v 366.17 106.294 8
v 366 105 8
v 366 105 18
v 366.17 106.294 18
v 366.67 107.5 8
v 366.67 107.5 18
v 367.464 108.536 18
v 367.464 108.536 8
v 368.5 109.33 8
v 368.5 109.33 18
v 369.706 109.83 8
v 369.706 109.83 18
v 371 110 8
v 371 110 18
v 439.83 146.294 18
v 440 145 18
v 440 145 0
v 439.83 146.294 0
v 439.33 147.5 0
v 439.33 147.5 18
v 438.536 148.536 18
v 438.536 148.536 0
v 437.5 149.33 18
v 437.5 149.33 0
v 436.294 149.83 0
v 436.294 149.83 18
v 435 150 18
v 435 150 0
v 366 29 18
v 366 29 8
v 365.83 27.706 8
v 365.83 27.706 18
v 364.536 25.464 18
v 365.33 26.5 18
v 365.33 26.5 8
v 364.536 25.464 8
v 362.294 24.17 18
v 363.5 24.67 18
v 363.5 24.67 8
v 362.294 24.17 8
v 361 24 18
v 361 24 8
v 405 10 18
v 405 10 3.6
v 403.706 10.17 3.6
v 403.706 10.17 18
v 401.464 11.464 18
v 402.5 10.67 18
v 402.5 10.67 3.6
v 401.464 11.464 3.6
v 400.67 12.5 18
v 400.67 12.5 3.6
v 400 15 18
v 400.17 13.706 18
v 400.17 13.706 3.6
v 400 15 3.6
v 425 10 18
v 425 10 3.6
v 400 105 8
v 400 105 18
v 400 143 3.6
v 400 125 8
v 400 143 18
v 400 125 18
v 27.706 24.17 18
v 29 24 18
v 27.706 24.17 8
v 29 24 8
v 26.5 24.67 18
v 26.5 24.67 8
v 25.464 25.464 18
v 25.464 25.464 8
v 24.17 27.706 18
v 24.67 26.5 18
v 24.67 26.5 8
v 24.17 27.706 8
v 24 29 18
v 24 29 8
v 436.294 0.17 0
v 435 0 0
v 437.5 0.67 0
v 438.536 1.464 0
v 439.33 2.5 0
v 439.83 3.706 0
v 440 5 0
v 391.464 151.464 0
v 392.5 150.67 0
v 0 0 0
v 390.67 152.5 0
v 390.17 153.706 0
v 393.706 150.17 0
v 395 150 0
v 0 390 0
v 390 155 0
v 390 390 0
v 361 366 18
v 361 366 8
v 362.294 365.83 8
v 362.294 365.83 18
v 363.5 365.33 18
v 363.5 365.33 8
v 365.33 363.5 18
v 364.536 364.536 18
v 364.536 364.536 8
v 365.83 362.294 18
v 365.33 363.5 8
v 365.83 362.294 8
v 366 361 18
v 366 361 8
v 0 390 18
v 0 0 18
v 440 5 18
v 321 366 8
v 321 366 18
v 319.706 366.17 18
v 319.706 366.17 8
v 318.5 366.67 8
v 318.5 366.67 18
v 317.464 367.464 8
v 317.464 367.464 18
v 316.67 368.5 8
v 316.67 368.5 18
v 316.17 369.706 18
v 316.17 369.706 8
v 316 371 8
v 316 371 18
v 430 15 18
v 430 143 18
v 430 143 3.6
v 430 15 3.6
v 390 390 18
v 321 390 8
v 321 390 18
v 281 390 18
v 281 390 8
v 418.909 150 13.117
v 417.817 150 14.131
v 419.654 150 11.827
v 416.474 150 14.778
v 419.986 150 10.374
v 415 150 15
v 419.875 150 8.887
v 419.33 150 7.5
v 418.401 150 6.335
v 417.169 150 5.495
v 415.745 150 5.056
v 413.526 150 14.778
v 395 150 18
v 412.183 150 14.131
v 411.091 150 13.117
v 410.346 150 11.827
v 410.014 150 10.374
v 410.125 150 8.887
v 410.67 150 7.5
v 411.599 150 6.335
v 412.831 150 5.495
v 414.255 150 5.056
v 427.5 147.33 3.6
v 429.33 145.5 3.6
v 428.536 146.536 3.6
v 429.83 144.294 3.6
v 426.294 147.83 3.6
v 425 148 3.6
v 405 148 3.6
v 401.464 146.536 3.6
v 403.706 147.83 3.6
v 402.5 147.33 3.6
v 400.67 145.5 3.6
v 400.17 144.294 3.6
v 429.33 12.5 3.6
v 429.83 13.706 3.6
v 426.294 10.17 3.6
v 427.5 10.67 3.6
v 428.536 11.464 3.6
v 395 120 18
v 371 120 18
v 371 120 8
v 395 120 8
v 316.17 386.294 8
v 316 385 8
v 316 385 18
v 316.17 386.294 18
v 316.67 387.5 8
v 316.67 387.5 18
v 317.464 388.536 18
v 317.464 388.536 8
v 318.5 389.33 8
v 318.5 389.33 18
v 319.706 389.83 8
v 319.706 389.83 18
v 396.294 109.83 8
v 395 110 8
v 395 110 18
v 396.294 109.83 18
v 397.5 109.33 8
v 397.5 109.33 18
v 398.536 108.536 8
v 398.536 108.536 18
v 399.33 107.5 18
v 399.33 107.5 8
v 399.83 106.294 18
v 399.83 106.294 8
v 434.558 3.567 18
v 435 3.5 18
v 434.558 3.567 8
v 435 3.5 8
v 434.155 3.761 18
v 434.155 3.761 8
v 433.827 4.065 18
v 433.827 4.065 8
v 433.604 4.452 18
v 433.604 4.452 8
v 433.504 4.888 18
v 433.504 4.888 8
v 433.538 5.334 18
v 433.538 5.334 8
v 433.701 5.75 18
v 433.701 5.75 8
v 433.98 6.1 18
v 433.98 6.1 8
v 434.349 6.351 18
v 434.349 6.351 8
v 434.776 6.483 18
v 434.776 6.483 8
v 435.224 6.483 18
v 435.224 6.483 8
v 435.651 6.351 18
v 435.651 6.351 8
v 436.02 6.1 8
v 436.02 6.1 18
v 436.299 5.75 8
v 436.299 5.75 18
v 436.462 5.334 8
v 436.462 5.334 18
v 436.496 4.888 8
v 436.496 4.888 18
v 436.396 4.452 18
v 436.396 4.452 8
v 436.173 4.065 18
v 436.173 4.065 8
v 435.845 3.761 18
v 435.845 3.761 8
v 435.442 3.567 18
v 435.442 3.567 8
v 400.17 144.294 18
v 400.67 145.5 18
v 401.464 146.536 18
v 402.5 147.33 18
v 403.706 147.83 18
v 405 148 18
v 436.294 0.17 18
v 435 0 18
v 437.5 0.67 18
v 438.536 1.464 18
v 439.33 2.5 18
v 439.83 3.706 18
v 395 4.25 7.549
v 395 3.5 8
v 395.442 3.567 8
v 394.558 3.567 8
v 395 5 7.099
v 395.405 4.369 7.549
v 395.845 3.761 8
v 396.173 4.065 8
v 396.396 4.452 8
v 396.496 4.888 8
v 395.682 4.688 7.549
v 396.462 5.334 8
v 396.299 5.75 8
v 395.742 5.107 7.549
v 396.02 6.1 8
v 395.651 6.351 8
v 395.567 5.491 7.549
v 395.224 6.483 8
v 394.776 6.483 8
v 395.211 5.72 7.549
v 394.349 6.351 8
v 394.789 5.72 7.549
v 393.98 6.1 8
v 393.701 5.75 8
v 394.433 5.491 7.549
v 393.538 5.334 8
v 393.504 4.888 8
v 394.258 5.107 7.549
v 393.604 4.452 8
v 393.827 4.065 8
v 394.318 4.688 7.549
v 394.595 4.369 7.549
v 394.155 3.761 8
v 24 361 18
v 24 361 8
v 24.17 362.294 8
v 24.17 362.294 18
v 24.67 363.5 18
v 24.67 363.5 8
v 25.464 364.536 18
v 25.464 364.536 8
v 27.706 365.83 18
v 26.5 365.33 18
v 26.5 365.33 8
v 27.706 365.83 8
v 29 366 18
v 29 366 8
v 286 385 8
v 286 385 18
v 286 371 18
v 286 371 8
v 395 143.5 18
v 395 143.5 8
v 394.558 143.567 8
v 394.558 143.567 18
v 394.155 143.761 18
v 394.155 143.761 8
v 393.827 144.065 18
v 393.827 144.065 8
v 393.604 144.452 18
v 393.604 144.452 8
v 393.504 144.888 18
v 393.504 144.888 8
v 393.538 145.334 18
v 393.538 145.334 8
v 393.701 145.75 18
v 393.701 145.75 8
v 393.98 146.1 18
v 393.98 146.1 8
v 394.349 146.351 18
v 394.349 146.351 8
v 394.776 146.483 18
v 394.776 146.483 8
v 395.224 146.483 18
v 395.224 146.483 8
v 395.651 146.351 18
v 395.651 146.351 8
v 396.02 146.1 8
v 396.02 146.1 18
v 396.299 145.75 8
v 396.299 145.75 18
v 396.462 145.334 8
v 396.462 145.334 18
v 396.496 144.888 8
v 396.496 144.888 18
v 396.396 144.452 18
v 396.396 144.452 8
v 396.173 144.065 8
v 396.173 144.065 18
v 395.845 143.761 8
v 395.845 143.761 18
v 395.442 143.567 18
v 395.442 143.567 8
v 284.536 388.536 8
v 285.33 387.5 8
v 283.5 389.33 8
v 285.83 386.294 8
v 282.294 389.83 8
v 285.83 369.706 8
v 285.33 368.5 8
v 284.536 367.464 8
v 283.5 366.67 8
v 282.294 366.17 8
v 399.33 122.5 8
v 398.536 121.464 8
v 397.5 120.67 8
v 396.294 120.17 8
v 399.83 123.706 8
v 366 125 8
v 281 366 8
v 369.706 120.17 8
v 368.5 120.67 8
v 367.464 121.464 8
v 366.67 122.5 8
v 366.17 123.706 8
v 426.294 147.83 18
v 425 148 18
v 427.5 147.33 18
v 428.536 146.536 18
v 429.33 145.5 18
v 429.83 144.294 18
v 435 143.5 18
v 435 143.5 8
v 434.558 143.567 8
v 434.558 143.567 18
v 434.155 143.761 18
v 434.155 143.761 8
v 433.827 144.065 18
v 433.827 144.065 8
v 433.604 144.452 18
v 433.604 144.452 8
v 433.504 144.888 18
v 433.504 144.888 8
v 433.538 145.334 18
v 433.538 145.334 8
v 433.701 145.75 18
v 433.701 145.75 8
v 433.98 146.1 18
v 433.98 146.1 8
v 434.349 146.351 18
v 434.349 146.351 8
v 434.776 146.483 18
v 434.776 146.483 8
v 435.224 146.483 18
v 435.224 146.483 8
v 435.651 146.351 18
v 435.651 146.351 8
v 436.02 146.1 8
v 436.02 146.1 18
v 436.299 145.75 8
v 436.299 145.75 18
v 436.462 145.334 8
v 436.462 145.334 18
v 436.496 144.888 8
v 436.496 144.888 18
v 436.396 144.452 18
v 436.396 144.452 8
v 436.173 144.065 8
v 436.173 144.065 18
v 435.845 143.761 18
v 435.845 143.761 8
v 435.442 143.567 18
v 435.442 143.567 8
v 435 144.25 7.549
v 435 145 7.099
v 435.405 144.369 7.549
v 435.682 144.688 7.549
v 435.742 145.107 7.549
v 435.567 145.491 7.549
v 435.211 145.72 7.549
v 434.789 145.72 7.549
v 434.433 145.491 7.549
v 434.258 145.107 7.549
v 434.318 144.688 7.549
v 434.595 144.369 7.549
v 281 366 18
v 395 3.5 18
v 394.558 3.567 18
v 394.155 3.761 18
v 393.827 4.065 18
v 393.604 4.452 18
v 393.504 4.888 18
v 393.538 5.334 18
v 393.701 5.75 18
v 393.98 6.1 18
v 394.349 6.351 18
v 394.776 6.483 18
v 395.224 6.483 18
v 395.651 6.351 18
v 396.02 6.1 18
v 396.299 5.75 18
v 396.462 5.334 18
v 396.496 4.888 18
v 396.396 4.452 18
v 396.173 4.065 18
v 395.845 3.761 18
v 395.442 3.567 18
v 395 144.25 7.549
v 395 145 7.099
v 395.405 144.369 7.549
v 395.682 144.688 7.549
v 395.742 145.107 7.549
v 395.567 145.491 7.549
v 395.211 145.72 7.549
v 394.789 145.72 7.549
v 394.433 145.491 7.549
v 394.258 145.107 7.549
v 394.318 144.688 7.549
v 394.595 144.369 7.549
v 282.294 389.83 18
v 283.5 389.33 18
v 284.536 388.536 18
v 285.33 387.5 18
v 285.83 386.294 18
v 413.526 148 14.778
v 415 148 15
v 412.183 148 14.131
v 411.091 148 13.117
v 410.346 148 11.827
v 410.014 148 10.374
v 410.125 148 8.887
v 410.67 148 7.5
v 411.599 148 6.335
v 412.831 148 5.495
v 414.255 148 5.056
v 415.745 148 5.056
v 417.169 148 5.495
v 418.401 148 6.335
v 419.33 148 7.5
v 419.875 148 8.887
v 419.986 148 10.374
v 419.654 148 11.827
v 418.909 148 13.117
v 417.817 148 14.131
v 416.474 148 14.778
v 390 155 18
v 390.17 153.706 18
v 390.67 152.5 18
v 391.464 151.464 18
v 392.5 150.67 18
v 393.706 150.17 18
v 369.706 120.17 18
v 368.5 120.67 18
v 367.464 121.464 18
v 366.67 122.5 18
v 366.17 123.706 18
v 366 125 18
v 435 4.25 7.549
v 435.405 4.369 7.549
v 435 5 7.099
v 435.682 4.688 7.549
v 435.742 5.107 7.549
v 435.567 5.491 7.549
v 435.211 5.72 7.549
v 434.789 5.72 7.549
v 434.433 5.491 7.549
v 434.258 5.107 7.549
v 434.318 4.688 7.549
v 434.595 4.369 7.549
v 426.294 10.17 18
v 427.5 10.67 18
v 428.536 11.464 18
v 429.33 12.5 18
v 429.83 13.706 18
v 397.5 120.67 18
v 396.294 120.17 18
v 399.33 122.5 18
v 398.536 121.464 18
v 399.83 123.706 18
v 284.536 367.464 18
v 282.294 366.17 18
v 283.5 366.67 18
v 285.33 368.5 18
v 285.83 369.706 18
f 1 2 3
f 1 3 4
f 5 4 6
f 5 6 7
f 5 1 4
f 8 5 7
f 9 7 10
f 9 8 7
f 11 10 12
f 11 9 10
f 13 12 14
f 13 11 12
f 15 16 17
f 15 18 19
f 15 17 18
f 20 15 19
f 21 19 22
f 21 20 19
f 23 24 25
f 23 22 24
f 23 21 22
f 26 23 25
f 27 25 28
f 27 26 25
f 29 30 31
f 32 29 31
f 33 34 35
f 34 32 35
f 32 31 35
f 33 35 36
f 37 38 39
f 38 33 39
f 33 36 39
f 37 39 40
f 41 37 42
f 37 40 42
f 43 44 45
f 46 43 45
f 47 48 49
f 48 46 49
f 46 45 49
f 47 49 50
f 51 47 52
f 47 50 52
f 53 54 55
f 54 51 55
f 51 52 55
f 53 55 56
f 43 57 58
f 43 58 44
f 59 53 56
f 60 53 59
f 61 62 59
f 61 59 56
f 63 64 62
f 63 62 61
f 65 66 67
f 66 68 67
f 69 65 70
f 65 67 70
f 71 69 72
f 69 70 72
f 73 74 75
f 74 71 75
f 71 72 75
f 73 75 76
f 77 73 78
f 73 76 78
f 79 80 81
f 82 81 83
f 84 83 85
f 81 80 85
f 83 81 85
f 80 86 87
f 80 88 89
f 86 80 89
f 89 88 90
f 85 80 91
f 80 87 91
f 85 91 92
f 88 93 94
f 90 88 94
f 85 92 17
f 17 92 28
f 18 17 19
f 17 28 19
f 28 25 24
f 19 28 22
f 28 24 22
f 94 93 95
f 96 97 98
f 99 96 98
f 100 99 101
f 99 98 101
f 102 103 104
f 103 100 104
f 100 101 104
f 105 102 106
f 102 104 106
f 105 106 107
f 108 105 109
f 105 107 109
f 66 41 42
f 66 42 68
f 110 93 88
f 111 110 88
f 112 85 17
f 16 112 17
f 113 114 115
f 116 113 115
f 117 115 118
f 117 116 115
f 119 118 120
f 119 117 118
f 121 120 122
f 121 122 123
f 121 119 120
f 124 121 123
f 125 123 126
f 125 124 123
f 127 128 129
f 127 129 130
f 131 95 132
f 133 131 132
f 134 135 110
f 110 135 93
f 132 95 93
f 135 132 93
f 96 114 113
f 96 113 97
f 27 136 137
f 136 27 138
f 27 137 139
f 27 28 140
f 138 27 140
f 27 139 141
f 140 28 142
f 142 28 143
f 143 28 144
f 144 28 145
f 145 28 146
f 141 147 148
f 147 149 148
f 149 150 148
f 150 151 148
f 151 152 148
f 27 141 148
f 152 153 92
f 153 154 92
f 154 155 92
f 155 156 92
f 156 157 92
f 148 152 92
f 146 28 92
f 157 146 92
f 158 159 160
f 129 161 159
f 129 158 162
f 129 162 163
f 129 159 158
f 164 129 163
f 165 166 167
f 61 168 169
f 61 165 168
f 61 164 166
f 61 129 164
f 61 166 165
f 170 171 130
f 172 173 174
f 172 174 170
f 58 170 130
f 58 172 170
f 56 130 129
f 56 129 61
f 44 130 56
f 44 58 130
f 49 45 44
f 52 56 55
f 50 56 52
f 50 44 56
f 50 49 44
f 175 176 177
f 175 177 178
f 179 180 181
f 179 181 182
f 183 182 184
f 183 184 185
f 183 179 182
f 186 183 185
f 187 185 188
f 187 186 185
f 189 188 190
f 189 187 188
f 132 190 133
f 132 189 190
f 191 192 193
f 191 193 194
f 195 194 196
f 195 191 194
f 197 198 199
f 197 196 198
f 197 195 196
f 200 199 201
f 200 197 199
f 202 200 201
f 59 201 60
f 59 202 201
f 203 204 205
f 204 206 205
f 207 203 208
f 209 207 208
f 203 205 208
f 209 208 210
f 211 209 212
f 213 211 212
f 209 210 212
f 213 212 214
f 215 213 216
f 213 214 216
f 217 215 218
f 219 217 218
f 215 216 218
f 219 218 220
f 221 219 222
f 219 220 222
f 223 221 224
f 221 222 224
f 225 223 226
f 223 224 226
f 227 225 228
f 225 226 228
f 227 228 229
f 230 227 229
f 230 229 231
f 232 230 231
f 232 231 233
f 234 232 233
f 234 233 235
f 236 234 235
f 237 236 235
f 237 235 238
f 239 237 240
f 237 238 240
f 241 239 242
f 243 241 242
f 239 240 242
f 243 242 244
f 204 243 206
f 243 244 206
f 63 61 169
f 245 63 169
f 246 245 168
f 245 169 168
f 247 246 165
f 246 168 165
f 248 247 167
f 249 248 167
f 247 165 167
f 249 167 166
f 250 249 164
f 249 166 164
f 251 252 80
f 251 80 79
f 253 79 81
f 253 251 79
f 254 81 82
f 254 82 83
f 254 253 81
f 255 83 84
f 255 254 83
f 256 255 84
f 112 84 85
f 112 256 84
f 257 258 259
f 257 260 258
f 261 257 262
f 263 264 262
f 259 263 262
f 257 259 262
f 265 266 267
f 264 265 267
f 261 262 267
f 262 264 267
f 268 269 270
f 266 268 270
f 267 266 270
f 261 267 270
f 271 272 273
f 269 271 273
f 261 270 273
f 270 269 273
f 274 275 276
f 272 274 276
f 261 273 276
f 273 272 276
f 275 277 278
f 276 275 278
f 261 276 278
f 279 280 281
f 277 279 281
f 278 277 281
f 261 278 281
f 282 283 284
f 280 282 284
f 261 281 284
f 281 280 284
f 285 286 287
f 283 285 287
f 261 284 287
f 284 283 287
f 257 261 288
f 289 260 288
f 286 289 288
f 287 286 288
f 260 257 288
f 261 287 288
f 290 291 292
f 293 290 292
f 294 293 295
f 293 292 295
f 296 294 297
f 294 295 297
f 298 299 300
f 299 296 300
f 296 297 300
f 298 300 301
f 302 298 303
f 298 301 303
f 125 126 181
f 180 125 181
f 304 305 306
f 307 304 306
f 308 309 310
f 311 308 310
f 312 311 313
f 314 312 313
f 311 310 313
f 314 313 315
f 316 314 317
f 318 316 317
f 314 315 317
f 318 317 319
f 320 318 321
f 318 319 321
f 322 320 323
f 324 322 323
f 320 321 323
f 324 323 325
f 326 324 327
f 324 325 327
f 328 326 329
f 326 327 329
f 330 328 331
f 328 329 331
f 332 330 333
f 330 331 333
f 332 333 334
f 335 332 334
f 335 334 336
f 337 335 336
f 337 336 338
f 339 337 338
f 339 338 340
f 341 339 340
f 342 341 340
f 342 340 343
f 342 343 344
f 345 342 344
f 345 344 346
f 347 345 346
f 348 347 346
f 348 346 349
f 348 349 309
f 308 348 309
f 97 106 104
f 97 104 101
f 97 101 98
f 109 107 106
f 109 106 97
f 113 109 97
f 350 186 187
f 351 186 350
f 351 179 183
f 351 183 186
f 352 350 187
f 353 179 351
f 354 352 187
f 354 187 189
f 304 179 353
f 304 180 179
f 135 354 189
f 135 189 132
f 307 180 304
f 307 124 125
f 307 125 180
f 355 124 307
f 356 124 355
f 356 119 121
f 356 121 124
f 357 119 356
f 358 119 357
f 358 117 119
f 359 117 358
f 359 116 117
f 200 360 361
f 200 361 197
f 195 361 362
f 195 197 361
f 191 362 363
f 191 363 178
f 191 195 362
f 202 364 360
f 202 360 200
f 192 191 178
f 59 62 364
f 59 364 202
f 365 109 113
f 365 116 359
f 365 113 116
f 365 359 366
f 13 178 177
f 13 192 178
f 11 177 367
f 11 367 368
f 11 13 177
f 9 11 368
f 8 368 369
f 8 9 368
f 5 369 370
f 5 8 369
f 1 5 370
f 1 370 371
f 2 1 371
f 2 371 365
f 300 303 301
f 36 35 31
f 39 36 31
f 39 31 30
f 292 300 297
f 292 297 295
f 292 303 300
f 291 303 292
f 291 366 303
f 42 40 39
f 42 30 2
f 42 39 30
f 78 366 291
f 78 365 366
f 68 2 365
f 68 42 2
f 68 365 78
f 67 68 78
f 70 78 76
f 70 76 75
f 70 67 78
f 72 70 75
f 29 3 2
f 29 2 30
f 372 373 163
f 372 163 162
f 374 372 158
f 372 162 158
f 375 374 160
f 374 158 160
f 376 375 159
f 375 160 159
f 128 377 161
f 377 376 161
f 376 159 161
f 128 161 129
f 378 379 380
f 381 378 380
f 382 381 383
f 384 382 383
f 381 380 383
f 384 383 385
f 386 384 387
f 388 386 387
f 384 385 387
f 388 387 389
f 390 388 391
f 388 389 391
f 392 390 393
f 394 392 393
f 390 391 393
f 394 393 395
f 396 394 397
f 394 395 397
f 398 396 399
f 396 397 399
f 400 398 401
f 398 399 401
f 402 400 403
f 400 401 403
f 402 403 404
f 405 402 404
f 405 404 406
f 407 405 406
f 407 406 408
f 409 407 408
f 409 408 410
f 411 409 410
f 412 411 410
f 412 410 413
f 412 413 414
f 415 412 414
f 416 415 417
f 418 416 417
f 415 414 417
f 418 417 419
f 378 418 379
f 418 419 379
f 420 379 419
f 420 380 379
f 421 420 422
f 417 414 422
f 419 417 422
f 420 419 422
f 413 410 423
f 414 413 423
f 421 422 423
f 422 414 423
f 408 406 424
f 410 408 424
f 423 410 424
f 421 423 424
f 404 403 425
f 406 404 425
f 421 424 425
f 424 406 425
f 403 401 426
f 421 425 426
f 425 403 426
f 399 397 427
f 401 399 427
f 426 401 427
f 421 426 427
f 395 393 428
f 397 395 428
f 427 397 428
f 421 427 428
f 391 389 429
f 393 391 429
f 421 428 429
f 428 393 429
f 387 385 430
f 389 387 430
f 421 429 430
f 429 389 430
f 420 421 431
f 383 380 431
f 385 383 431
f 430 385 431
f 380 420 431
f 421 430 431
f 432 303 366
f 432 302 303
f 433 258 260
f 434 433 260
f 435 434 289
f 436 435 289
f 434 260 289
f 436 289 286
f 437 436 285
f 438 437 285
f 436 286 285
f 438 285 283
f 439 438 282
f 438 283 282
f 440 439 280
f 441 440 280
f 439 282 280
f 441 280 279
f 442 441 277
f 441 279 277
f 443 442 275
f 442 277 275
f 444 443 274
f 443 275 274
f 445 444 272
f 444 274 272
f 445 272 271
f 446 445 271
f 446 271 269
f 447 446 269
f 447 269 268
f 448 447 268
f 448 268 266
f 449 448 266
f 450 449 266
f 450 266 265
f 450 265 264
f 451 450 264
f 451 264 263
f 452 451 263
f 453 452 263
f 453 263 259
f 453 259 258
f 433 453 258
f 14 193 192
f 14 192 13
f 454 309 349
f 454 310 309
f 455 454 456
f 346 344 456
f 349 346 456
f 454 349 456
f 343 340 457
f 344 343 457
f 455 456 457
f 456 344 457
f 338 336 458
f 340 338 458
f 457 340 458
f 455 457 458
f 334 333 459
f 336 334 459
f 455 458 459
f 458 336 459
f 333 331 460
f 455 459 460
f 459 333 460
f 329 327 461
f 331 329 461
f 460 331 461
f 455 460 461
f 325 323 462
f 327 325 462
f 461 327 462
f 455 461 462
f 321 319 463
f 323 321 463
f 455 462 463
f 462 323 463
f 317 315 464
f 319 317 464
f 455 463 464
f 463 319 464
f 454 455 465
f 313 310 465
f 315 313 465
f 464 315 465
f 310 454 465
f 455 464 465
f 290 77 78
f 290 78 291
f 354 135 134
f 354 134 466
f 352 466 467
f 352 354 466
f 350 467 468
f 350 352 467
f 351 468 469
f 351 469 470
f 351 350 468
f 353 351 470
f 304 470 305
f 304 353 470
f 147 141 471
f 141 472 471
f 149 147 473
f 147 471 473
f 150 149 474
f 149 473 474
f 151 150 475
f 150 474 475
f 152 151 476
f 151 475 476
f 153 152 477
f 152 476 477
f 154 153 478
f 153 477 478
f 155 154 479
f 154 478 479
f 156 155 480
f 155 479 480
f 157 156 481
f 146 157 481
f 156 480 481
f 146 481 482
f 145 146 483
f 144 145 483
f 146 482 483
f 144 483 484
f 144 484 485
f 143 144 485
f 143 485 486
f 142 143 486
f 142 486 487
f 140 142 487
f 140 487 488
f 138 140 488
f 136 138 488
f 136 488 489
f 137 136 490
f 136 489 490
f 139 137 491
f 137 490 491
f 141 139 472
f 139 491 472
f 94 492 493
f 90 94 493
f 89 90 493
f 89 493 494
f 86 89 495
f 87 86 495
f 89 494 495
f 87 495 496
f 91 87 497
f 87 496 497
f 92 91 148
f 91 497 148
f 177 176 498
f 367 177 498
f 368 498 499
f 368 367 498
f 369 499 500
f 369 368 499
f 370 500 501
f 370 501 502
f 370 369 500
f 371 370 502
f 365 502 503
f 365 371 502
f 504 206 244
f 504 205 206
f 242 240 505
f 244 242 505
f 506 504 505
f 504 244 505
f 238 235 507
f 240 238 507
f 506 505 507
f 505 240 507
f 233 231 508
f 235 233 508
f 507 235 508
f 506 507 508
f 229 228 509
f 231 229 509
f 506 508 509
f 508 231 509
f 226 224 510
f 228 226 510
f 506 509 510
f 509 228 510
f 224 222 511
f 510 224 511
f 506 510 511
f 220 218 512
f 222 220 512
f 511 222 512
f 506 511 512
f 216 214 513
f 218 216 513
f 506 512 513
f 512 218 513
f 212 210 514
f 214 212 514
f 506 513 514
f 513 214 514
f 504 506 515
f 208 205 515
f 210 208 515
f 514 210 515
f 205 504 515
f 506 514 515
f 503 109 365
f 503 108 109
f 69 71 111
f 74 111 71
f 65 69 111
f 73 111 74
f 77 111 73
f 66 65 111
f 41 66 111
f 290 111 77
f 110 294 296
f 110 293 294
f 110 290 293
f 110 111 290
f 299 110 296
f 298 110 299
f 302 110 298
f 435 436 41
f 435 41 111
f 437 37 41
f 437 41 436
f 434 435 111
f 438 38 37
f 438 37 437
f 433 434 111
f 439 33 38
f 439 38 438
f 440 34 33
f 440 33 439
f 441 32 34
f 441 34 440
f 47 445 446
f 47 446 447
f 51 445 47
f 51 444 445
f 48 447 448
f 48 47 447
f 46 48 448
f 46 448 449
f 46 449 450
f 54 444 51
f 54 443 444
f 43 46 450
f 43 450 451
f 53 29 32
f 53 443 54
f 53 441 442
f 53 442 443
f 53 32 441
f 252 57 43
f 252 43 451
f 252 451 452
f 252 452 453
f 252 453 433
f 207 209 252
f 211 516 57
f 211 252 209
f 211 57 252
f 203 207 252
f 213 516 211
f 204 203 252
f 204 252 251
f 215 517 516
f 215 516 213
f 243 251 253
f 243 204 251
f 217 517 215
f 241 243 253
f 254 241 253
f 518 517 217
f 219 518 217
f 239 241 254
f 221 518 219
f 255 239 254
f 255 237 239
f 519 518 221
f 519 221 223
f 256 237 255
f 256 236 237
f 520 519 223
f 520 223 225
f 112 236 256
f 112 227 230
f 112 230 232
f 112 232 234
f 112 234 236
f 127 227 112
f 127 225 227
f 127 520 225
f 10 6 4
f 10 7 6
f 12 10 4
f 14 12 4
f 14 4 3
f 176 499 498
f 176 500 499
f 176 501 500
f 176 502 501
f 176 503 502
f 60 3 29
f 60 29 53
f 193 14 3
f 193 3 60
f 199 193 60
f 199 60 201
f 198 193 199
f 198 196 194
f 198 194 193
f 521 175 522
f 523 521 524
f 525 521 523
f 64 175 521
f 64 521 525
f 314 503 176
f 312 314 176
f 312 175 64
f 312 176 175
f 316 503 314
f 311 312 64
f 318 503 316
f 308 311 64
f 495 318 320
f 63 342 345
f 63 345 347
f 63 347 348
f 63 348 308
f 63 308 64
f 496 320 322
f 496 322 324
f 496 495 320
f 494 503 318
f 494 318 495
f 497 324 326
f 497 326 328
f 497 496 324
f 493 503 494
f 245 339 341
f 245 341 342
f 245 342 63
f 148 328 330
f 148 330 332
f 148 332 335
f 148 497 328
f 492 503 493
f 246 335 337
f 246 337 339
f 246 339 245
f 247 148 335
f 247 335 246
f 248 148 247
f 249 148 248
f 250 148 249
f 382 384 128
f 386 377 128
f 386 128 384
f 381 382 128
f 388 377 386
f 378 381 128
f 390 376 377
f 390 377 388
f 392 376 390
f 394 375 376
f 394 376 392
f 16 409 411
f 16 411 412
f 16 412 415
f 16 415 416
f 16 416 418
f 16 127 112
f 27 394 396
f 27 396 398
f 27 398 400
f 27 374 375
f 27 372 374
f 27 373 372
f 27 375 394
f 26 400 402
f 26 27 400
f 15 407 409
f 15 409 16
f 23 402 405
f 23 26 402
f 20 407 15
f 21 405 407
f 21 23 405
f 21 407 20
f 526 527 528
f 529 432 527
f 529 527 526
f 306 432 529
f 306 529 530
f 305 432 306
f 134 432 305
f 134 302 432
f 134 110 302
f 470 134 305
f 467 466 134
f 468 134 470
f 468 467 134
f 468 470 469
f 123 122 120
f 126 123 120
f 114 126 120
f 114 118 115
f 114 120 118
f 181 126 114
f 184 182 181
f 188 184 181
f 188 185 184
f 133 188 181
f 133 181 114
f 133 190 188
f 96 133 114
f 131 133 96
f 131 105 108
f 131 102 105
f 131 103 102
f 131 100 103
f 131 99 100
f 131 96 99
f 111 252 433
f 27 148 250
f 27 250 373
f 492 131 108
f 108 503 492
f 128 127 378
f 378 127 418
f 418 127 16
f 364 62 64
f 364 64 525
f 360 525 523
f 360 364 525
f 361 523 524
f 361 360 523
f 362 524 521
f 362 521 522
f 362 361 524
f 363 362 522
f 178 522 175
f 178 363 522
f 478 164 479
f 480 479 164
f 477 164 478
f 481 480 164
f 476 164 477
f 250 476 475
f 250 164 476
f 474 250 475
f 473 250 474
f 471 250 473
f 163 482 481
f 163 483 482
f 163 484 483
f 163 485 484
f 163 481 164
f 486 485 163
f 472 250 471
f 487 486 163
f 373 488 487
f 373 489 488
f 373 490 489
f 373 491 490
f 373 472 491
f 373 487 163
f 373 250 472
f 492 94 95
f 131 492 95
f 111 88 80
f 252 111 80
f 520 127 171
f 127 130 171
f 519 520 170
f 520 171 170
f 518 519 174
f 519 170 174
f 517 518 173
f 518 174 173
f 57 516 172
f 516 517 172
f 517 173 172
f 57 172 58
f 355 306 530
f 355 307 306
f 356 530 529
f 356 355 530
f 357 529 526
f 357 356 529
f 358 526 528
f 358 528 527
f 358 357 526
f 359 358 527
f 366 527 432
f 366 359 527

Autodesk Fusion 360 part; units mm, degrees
sketch "Sketch1" plane through (0, 0, 0) normal (0, 0, 1) x (1, 0, 0)
  line L0 (0, 0) -> (390, 0)
  line L1 (390, 0) -> (390, 390)
  line L2 (390, 390) -> (0, 390)
  line L3 (0, 390) -> (0, 0)
  line L4 (390, 0) -> (440, 0)
  line L5 (440, 0) -> (440, 150)
  line L6 (440, 150) -> (390, 150)
  line L7 (390, 150) -> (390, 0)
  dimension "d5" = 390
  dimension "d6" = 390
  dimension "d23" = 150
  dimension "d26" = 50
extrude "Extrude1" add sketch "Sketch1" along normal blind 18
fillet "Fillet2" radius 5 3 edges at (440, 0, 9) (440, 150, 9) (390, 150, 9)
sketch "Sketch4" plane through (0, 0, 18) normal (0, 0, 1) x (-1, 0, 0)
  arc A0 (-440, -145) -> (-435, -150) centre (-435, -145) ccw
  line L0 (-435, -150) -> (-395, -150)
  arc A1 (-390, -155) -> (-395, -150) centre (-395, -155) ccw
  line L1 (-390, -155) -> (-390, -390)
  line L2 (-390, -390) -> (0, -390)
  line L3 (0, -390) -> (0, 0)
  line L4 (0, 0) -> (-435, 0)
  arc A2 (-435, 0) -> (-440, -5) centre (-435, -5) ccw
  line L5 (-440, -5) -> (-440, -145)
  line L6 (-400, -148) -> (-430, -148)
  line L7 (-430, -148) -> (-430, -10)
  line L8 (-430, -10) -> (-400, -10)
  line L9 (-400, -10) -> (-400, -148)
  point P0 (-395, -145)
  point P1 (-435, -145)
  point P2 (-435, -5)
  point P3 (-395, -5)
  dimension "d28" = 10
  dimension "d29" = 10
  dimension "d30" = 10
  dimension "d38" = 2
  dimension "d50" = 5
  dimension "d51" = 5
  dimension "d52" = 5
  dimension "d53" = 5
  dimension "d54" = 5
  dimension "d55" = 45
  dimension "d59" = 45
extrude "Extrude4" cut sketch "Sketch4" against normal blind 14.4 contours L6 L7 L8 L9
fillet "Fillet3" radius 5 4 edges at (400, 10, 10.8) (430, 10, 10.8) (400, 148, 10.8) (430, 148, 10.8)
sketch "Sketch5" plane through (0, 0, 18) normal (0, 0, 1) x (-1, 0, 0)
  line L0 (-400, -15) -> (-400, -143)
  arc A0 (-390, -155) -> (-395, -150) centre (-395, -155) ccw
  line L1 (-390, -155) -> (-390, -390)
  line L2 (-390, -390) -> (0, -390)
  line L3 (0, -390) -> (0, 0)
  line L4 (0, 0) -> (-435, 0)
  arc A1 (-435, 0) -> (-440, -5) centre (-435, -5) ccw
  line L5 (-440, -5) -> (-440, -145)
  arc A2 (-440, -145) -> (-435, -150) centre (-435, -145) ccw
  line L6 (-435, -150) -> (-395, -150)
  line L7 (-430, -143) -> (-430, -15)
  arc A3 (-425, -10) -> (-430, -15) centre (-425, -15) ccw
  line L8 (-425, -10) -> (-405, -10)
  arc A4 (-400, -15) -> (-405, -10) centre (-405, -15) ccw
  line L9 (-24, -366) -> (-366, -366)
  line L10 (-366, -366) -> (-366, -24)
  line L11 (-366, -24) -> (-24, -24)
  line L12 (-24, -24) -> (-24, -366)
  line L13 (-405, -148) -> (-425, -148)
  arc A5 (-405, -148) -> (-400, -143) centre (-405, -143) ccw
  arc A6 (-430, -143) -> (-425, -148) centre (-425, -143) ccw
  line L14 (-316, -366) -> (-316, -390)
  line L15 (-316, -390) -> (-286, -390)
  line L16 (-286, -390) -> (-286, -366)
  line L17 (-366, -120) -> (-400, -120)
  line L18 (-400, -120) -> (-400, -110)
  line L19 (-400, -110) -> (-366, -110)
  line L20 (-366, -110) -> (-366, -120)
  dimension "d34" = 342
  dimension "d35" = 342
  dimension "d36" = 24
  dimension "d37" = 24
  dimension "d41" = 50
  dimension "d42" = 30
  dimension "d60" = 30
  dimension "d61" = 10
extrude "Extrude5" cut sketch "Sketch5" against normal blind 10 contours L0 L10 L17 L18 L19 L20 | L9 L10 L11 L12 L20 | L2 L9 L14 L15 L16
fillet "Fillet4" radius 5 8 edges at (24, 366, 13) (286, 366, 13) (24, 24, 13) (366, 24, 13) (366, 366, 13) (316, 366, 13) (316, 390, 13) (286, 390, 13)
fillet "Fillet4" radius 5 4 edges at (366, 120, 13) (400, 120, 13) (366, 110, 13) (400, 110, 13)
sketch "Sketch6" plane through (0, 150, 0) normal (0, 1, 0) x (-1, 0, 0)
  line L0 (-395, 0) -> (-395, 18)
  line L1 (-435, 18) -> (-435, 0)
  line L2 (-435, 0) -> (-395, 0)
  line L3 (-440, 18) -> (-440, 0)
  line L4 (-395, 18) -> (-435, 18)
  point P0 (-415, 10)
  dimension "d45" = 25
  dimension "d46" = 10
hole "Hole1" at (415, 150, 10) direction (0, -1, 0) diameter 10 depth 2 tip angle 118
hole "Hole2" at (395, 5, 18) at (435, 5, 18) at (435, 145, 18) at (395, 145, 18) direction (0, 0, -1) diameter 3 depth 10 tip angle 118
equation "b = 350 mm"
equation "d = 350 mm"
equation "t_base = 18 mm"
equation "a_ramme = 20 mm"
equation "d5 = d + 2 * a_ramme"
equation "d6 = b + 2 * a_ramme"
equation "d7 = t_base"
equation "t = 4 mm"
equation "a_outlet = 30 mm"
equation "d23 = d_utilites"
equation "b_utilities = 50 mm"
equation "d_utilites = 150 mm"
equation "d26 = b_utilities"
equation "d31 = -t_base * 0.8"
equation "d34 = b - 2 * t"
equation "d35 = d - 2 * t"
equation "d36 = a_ramme + t"
equation "d37 = a_ramme + t"
equation "d42 = a_outlet"
